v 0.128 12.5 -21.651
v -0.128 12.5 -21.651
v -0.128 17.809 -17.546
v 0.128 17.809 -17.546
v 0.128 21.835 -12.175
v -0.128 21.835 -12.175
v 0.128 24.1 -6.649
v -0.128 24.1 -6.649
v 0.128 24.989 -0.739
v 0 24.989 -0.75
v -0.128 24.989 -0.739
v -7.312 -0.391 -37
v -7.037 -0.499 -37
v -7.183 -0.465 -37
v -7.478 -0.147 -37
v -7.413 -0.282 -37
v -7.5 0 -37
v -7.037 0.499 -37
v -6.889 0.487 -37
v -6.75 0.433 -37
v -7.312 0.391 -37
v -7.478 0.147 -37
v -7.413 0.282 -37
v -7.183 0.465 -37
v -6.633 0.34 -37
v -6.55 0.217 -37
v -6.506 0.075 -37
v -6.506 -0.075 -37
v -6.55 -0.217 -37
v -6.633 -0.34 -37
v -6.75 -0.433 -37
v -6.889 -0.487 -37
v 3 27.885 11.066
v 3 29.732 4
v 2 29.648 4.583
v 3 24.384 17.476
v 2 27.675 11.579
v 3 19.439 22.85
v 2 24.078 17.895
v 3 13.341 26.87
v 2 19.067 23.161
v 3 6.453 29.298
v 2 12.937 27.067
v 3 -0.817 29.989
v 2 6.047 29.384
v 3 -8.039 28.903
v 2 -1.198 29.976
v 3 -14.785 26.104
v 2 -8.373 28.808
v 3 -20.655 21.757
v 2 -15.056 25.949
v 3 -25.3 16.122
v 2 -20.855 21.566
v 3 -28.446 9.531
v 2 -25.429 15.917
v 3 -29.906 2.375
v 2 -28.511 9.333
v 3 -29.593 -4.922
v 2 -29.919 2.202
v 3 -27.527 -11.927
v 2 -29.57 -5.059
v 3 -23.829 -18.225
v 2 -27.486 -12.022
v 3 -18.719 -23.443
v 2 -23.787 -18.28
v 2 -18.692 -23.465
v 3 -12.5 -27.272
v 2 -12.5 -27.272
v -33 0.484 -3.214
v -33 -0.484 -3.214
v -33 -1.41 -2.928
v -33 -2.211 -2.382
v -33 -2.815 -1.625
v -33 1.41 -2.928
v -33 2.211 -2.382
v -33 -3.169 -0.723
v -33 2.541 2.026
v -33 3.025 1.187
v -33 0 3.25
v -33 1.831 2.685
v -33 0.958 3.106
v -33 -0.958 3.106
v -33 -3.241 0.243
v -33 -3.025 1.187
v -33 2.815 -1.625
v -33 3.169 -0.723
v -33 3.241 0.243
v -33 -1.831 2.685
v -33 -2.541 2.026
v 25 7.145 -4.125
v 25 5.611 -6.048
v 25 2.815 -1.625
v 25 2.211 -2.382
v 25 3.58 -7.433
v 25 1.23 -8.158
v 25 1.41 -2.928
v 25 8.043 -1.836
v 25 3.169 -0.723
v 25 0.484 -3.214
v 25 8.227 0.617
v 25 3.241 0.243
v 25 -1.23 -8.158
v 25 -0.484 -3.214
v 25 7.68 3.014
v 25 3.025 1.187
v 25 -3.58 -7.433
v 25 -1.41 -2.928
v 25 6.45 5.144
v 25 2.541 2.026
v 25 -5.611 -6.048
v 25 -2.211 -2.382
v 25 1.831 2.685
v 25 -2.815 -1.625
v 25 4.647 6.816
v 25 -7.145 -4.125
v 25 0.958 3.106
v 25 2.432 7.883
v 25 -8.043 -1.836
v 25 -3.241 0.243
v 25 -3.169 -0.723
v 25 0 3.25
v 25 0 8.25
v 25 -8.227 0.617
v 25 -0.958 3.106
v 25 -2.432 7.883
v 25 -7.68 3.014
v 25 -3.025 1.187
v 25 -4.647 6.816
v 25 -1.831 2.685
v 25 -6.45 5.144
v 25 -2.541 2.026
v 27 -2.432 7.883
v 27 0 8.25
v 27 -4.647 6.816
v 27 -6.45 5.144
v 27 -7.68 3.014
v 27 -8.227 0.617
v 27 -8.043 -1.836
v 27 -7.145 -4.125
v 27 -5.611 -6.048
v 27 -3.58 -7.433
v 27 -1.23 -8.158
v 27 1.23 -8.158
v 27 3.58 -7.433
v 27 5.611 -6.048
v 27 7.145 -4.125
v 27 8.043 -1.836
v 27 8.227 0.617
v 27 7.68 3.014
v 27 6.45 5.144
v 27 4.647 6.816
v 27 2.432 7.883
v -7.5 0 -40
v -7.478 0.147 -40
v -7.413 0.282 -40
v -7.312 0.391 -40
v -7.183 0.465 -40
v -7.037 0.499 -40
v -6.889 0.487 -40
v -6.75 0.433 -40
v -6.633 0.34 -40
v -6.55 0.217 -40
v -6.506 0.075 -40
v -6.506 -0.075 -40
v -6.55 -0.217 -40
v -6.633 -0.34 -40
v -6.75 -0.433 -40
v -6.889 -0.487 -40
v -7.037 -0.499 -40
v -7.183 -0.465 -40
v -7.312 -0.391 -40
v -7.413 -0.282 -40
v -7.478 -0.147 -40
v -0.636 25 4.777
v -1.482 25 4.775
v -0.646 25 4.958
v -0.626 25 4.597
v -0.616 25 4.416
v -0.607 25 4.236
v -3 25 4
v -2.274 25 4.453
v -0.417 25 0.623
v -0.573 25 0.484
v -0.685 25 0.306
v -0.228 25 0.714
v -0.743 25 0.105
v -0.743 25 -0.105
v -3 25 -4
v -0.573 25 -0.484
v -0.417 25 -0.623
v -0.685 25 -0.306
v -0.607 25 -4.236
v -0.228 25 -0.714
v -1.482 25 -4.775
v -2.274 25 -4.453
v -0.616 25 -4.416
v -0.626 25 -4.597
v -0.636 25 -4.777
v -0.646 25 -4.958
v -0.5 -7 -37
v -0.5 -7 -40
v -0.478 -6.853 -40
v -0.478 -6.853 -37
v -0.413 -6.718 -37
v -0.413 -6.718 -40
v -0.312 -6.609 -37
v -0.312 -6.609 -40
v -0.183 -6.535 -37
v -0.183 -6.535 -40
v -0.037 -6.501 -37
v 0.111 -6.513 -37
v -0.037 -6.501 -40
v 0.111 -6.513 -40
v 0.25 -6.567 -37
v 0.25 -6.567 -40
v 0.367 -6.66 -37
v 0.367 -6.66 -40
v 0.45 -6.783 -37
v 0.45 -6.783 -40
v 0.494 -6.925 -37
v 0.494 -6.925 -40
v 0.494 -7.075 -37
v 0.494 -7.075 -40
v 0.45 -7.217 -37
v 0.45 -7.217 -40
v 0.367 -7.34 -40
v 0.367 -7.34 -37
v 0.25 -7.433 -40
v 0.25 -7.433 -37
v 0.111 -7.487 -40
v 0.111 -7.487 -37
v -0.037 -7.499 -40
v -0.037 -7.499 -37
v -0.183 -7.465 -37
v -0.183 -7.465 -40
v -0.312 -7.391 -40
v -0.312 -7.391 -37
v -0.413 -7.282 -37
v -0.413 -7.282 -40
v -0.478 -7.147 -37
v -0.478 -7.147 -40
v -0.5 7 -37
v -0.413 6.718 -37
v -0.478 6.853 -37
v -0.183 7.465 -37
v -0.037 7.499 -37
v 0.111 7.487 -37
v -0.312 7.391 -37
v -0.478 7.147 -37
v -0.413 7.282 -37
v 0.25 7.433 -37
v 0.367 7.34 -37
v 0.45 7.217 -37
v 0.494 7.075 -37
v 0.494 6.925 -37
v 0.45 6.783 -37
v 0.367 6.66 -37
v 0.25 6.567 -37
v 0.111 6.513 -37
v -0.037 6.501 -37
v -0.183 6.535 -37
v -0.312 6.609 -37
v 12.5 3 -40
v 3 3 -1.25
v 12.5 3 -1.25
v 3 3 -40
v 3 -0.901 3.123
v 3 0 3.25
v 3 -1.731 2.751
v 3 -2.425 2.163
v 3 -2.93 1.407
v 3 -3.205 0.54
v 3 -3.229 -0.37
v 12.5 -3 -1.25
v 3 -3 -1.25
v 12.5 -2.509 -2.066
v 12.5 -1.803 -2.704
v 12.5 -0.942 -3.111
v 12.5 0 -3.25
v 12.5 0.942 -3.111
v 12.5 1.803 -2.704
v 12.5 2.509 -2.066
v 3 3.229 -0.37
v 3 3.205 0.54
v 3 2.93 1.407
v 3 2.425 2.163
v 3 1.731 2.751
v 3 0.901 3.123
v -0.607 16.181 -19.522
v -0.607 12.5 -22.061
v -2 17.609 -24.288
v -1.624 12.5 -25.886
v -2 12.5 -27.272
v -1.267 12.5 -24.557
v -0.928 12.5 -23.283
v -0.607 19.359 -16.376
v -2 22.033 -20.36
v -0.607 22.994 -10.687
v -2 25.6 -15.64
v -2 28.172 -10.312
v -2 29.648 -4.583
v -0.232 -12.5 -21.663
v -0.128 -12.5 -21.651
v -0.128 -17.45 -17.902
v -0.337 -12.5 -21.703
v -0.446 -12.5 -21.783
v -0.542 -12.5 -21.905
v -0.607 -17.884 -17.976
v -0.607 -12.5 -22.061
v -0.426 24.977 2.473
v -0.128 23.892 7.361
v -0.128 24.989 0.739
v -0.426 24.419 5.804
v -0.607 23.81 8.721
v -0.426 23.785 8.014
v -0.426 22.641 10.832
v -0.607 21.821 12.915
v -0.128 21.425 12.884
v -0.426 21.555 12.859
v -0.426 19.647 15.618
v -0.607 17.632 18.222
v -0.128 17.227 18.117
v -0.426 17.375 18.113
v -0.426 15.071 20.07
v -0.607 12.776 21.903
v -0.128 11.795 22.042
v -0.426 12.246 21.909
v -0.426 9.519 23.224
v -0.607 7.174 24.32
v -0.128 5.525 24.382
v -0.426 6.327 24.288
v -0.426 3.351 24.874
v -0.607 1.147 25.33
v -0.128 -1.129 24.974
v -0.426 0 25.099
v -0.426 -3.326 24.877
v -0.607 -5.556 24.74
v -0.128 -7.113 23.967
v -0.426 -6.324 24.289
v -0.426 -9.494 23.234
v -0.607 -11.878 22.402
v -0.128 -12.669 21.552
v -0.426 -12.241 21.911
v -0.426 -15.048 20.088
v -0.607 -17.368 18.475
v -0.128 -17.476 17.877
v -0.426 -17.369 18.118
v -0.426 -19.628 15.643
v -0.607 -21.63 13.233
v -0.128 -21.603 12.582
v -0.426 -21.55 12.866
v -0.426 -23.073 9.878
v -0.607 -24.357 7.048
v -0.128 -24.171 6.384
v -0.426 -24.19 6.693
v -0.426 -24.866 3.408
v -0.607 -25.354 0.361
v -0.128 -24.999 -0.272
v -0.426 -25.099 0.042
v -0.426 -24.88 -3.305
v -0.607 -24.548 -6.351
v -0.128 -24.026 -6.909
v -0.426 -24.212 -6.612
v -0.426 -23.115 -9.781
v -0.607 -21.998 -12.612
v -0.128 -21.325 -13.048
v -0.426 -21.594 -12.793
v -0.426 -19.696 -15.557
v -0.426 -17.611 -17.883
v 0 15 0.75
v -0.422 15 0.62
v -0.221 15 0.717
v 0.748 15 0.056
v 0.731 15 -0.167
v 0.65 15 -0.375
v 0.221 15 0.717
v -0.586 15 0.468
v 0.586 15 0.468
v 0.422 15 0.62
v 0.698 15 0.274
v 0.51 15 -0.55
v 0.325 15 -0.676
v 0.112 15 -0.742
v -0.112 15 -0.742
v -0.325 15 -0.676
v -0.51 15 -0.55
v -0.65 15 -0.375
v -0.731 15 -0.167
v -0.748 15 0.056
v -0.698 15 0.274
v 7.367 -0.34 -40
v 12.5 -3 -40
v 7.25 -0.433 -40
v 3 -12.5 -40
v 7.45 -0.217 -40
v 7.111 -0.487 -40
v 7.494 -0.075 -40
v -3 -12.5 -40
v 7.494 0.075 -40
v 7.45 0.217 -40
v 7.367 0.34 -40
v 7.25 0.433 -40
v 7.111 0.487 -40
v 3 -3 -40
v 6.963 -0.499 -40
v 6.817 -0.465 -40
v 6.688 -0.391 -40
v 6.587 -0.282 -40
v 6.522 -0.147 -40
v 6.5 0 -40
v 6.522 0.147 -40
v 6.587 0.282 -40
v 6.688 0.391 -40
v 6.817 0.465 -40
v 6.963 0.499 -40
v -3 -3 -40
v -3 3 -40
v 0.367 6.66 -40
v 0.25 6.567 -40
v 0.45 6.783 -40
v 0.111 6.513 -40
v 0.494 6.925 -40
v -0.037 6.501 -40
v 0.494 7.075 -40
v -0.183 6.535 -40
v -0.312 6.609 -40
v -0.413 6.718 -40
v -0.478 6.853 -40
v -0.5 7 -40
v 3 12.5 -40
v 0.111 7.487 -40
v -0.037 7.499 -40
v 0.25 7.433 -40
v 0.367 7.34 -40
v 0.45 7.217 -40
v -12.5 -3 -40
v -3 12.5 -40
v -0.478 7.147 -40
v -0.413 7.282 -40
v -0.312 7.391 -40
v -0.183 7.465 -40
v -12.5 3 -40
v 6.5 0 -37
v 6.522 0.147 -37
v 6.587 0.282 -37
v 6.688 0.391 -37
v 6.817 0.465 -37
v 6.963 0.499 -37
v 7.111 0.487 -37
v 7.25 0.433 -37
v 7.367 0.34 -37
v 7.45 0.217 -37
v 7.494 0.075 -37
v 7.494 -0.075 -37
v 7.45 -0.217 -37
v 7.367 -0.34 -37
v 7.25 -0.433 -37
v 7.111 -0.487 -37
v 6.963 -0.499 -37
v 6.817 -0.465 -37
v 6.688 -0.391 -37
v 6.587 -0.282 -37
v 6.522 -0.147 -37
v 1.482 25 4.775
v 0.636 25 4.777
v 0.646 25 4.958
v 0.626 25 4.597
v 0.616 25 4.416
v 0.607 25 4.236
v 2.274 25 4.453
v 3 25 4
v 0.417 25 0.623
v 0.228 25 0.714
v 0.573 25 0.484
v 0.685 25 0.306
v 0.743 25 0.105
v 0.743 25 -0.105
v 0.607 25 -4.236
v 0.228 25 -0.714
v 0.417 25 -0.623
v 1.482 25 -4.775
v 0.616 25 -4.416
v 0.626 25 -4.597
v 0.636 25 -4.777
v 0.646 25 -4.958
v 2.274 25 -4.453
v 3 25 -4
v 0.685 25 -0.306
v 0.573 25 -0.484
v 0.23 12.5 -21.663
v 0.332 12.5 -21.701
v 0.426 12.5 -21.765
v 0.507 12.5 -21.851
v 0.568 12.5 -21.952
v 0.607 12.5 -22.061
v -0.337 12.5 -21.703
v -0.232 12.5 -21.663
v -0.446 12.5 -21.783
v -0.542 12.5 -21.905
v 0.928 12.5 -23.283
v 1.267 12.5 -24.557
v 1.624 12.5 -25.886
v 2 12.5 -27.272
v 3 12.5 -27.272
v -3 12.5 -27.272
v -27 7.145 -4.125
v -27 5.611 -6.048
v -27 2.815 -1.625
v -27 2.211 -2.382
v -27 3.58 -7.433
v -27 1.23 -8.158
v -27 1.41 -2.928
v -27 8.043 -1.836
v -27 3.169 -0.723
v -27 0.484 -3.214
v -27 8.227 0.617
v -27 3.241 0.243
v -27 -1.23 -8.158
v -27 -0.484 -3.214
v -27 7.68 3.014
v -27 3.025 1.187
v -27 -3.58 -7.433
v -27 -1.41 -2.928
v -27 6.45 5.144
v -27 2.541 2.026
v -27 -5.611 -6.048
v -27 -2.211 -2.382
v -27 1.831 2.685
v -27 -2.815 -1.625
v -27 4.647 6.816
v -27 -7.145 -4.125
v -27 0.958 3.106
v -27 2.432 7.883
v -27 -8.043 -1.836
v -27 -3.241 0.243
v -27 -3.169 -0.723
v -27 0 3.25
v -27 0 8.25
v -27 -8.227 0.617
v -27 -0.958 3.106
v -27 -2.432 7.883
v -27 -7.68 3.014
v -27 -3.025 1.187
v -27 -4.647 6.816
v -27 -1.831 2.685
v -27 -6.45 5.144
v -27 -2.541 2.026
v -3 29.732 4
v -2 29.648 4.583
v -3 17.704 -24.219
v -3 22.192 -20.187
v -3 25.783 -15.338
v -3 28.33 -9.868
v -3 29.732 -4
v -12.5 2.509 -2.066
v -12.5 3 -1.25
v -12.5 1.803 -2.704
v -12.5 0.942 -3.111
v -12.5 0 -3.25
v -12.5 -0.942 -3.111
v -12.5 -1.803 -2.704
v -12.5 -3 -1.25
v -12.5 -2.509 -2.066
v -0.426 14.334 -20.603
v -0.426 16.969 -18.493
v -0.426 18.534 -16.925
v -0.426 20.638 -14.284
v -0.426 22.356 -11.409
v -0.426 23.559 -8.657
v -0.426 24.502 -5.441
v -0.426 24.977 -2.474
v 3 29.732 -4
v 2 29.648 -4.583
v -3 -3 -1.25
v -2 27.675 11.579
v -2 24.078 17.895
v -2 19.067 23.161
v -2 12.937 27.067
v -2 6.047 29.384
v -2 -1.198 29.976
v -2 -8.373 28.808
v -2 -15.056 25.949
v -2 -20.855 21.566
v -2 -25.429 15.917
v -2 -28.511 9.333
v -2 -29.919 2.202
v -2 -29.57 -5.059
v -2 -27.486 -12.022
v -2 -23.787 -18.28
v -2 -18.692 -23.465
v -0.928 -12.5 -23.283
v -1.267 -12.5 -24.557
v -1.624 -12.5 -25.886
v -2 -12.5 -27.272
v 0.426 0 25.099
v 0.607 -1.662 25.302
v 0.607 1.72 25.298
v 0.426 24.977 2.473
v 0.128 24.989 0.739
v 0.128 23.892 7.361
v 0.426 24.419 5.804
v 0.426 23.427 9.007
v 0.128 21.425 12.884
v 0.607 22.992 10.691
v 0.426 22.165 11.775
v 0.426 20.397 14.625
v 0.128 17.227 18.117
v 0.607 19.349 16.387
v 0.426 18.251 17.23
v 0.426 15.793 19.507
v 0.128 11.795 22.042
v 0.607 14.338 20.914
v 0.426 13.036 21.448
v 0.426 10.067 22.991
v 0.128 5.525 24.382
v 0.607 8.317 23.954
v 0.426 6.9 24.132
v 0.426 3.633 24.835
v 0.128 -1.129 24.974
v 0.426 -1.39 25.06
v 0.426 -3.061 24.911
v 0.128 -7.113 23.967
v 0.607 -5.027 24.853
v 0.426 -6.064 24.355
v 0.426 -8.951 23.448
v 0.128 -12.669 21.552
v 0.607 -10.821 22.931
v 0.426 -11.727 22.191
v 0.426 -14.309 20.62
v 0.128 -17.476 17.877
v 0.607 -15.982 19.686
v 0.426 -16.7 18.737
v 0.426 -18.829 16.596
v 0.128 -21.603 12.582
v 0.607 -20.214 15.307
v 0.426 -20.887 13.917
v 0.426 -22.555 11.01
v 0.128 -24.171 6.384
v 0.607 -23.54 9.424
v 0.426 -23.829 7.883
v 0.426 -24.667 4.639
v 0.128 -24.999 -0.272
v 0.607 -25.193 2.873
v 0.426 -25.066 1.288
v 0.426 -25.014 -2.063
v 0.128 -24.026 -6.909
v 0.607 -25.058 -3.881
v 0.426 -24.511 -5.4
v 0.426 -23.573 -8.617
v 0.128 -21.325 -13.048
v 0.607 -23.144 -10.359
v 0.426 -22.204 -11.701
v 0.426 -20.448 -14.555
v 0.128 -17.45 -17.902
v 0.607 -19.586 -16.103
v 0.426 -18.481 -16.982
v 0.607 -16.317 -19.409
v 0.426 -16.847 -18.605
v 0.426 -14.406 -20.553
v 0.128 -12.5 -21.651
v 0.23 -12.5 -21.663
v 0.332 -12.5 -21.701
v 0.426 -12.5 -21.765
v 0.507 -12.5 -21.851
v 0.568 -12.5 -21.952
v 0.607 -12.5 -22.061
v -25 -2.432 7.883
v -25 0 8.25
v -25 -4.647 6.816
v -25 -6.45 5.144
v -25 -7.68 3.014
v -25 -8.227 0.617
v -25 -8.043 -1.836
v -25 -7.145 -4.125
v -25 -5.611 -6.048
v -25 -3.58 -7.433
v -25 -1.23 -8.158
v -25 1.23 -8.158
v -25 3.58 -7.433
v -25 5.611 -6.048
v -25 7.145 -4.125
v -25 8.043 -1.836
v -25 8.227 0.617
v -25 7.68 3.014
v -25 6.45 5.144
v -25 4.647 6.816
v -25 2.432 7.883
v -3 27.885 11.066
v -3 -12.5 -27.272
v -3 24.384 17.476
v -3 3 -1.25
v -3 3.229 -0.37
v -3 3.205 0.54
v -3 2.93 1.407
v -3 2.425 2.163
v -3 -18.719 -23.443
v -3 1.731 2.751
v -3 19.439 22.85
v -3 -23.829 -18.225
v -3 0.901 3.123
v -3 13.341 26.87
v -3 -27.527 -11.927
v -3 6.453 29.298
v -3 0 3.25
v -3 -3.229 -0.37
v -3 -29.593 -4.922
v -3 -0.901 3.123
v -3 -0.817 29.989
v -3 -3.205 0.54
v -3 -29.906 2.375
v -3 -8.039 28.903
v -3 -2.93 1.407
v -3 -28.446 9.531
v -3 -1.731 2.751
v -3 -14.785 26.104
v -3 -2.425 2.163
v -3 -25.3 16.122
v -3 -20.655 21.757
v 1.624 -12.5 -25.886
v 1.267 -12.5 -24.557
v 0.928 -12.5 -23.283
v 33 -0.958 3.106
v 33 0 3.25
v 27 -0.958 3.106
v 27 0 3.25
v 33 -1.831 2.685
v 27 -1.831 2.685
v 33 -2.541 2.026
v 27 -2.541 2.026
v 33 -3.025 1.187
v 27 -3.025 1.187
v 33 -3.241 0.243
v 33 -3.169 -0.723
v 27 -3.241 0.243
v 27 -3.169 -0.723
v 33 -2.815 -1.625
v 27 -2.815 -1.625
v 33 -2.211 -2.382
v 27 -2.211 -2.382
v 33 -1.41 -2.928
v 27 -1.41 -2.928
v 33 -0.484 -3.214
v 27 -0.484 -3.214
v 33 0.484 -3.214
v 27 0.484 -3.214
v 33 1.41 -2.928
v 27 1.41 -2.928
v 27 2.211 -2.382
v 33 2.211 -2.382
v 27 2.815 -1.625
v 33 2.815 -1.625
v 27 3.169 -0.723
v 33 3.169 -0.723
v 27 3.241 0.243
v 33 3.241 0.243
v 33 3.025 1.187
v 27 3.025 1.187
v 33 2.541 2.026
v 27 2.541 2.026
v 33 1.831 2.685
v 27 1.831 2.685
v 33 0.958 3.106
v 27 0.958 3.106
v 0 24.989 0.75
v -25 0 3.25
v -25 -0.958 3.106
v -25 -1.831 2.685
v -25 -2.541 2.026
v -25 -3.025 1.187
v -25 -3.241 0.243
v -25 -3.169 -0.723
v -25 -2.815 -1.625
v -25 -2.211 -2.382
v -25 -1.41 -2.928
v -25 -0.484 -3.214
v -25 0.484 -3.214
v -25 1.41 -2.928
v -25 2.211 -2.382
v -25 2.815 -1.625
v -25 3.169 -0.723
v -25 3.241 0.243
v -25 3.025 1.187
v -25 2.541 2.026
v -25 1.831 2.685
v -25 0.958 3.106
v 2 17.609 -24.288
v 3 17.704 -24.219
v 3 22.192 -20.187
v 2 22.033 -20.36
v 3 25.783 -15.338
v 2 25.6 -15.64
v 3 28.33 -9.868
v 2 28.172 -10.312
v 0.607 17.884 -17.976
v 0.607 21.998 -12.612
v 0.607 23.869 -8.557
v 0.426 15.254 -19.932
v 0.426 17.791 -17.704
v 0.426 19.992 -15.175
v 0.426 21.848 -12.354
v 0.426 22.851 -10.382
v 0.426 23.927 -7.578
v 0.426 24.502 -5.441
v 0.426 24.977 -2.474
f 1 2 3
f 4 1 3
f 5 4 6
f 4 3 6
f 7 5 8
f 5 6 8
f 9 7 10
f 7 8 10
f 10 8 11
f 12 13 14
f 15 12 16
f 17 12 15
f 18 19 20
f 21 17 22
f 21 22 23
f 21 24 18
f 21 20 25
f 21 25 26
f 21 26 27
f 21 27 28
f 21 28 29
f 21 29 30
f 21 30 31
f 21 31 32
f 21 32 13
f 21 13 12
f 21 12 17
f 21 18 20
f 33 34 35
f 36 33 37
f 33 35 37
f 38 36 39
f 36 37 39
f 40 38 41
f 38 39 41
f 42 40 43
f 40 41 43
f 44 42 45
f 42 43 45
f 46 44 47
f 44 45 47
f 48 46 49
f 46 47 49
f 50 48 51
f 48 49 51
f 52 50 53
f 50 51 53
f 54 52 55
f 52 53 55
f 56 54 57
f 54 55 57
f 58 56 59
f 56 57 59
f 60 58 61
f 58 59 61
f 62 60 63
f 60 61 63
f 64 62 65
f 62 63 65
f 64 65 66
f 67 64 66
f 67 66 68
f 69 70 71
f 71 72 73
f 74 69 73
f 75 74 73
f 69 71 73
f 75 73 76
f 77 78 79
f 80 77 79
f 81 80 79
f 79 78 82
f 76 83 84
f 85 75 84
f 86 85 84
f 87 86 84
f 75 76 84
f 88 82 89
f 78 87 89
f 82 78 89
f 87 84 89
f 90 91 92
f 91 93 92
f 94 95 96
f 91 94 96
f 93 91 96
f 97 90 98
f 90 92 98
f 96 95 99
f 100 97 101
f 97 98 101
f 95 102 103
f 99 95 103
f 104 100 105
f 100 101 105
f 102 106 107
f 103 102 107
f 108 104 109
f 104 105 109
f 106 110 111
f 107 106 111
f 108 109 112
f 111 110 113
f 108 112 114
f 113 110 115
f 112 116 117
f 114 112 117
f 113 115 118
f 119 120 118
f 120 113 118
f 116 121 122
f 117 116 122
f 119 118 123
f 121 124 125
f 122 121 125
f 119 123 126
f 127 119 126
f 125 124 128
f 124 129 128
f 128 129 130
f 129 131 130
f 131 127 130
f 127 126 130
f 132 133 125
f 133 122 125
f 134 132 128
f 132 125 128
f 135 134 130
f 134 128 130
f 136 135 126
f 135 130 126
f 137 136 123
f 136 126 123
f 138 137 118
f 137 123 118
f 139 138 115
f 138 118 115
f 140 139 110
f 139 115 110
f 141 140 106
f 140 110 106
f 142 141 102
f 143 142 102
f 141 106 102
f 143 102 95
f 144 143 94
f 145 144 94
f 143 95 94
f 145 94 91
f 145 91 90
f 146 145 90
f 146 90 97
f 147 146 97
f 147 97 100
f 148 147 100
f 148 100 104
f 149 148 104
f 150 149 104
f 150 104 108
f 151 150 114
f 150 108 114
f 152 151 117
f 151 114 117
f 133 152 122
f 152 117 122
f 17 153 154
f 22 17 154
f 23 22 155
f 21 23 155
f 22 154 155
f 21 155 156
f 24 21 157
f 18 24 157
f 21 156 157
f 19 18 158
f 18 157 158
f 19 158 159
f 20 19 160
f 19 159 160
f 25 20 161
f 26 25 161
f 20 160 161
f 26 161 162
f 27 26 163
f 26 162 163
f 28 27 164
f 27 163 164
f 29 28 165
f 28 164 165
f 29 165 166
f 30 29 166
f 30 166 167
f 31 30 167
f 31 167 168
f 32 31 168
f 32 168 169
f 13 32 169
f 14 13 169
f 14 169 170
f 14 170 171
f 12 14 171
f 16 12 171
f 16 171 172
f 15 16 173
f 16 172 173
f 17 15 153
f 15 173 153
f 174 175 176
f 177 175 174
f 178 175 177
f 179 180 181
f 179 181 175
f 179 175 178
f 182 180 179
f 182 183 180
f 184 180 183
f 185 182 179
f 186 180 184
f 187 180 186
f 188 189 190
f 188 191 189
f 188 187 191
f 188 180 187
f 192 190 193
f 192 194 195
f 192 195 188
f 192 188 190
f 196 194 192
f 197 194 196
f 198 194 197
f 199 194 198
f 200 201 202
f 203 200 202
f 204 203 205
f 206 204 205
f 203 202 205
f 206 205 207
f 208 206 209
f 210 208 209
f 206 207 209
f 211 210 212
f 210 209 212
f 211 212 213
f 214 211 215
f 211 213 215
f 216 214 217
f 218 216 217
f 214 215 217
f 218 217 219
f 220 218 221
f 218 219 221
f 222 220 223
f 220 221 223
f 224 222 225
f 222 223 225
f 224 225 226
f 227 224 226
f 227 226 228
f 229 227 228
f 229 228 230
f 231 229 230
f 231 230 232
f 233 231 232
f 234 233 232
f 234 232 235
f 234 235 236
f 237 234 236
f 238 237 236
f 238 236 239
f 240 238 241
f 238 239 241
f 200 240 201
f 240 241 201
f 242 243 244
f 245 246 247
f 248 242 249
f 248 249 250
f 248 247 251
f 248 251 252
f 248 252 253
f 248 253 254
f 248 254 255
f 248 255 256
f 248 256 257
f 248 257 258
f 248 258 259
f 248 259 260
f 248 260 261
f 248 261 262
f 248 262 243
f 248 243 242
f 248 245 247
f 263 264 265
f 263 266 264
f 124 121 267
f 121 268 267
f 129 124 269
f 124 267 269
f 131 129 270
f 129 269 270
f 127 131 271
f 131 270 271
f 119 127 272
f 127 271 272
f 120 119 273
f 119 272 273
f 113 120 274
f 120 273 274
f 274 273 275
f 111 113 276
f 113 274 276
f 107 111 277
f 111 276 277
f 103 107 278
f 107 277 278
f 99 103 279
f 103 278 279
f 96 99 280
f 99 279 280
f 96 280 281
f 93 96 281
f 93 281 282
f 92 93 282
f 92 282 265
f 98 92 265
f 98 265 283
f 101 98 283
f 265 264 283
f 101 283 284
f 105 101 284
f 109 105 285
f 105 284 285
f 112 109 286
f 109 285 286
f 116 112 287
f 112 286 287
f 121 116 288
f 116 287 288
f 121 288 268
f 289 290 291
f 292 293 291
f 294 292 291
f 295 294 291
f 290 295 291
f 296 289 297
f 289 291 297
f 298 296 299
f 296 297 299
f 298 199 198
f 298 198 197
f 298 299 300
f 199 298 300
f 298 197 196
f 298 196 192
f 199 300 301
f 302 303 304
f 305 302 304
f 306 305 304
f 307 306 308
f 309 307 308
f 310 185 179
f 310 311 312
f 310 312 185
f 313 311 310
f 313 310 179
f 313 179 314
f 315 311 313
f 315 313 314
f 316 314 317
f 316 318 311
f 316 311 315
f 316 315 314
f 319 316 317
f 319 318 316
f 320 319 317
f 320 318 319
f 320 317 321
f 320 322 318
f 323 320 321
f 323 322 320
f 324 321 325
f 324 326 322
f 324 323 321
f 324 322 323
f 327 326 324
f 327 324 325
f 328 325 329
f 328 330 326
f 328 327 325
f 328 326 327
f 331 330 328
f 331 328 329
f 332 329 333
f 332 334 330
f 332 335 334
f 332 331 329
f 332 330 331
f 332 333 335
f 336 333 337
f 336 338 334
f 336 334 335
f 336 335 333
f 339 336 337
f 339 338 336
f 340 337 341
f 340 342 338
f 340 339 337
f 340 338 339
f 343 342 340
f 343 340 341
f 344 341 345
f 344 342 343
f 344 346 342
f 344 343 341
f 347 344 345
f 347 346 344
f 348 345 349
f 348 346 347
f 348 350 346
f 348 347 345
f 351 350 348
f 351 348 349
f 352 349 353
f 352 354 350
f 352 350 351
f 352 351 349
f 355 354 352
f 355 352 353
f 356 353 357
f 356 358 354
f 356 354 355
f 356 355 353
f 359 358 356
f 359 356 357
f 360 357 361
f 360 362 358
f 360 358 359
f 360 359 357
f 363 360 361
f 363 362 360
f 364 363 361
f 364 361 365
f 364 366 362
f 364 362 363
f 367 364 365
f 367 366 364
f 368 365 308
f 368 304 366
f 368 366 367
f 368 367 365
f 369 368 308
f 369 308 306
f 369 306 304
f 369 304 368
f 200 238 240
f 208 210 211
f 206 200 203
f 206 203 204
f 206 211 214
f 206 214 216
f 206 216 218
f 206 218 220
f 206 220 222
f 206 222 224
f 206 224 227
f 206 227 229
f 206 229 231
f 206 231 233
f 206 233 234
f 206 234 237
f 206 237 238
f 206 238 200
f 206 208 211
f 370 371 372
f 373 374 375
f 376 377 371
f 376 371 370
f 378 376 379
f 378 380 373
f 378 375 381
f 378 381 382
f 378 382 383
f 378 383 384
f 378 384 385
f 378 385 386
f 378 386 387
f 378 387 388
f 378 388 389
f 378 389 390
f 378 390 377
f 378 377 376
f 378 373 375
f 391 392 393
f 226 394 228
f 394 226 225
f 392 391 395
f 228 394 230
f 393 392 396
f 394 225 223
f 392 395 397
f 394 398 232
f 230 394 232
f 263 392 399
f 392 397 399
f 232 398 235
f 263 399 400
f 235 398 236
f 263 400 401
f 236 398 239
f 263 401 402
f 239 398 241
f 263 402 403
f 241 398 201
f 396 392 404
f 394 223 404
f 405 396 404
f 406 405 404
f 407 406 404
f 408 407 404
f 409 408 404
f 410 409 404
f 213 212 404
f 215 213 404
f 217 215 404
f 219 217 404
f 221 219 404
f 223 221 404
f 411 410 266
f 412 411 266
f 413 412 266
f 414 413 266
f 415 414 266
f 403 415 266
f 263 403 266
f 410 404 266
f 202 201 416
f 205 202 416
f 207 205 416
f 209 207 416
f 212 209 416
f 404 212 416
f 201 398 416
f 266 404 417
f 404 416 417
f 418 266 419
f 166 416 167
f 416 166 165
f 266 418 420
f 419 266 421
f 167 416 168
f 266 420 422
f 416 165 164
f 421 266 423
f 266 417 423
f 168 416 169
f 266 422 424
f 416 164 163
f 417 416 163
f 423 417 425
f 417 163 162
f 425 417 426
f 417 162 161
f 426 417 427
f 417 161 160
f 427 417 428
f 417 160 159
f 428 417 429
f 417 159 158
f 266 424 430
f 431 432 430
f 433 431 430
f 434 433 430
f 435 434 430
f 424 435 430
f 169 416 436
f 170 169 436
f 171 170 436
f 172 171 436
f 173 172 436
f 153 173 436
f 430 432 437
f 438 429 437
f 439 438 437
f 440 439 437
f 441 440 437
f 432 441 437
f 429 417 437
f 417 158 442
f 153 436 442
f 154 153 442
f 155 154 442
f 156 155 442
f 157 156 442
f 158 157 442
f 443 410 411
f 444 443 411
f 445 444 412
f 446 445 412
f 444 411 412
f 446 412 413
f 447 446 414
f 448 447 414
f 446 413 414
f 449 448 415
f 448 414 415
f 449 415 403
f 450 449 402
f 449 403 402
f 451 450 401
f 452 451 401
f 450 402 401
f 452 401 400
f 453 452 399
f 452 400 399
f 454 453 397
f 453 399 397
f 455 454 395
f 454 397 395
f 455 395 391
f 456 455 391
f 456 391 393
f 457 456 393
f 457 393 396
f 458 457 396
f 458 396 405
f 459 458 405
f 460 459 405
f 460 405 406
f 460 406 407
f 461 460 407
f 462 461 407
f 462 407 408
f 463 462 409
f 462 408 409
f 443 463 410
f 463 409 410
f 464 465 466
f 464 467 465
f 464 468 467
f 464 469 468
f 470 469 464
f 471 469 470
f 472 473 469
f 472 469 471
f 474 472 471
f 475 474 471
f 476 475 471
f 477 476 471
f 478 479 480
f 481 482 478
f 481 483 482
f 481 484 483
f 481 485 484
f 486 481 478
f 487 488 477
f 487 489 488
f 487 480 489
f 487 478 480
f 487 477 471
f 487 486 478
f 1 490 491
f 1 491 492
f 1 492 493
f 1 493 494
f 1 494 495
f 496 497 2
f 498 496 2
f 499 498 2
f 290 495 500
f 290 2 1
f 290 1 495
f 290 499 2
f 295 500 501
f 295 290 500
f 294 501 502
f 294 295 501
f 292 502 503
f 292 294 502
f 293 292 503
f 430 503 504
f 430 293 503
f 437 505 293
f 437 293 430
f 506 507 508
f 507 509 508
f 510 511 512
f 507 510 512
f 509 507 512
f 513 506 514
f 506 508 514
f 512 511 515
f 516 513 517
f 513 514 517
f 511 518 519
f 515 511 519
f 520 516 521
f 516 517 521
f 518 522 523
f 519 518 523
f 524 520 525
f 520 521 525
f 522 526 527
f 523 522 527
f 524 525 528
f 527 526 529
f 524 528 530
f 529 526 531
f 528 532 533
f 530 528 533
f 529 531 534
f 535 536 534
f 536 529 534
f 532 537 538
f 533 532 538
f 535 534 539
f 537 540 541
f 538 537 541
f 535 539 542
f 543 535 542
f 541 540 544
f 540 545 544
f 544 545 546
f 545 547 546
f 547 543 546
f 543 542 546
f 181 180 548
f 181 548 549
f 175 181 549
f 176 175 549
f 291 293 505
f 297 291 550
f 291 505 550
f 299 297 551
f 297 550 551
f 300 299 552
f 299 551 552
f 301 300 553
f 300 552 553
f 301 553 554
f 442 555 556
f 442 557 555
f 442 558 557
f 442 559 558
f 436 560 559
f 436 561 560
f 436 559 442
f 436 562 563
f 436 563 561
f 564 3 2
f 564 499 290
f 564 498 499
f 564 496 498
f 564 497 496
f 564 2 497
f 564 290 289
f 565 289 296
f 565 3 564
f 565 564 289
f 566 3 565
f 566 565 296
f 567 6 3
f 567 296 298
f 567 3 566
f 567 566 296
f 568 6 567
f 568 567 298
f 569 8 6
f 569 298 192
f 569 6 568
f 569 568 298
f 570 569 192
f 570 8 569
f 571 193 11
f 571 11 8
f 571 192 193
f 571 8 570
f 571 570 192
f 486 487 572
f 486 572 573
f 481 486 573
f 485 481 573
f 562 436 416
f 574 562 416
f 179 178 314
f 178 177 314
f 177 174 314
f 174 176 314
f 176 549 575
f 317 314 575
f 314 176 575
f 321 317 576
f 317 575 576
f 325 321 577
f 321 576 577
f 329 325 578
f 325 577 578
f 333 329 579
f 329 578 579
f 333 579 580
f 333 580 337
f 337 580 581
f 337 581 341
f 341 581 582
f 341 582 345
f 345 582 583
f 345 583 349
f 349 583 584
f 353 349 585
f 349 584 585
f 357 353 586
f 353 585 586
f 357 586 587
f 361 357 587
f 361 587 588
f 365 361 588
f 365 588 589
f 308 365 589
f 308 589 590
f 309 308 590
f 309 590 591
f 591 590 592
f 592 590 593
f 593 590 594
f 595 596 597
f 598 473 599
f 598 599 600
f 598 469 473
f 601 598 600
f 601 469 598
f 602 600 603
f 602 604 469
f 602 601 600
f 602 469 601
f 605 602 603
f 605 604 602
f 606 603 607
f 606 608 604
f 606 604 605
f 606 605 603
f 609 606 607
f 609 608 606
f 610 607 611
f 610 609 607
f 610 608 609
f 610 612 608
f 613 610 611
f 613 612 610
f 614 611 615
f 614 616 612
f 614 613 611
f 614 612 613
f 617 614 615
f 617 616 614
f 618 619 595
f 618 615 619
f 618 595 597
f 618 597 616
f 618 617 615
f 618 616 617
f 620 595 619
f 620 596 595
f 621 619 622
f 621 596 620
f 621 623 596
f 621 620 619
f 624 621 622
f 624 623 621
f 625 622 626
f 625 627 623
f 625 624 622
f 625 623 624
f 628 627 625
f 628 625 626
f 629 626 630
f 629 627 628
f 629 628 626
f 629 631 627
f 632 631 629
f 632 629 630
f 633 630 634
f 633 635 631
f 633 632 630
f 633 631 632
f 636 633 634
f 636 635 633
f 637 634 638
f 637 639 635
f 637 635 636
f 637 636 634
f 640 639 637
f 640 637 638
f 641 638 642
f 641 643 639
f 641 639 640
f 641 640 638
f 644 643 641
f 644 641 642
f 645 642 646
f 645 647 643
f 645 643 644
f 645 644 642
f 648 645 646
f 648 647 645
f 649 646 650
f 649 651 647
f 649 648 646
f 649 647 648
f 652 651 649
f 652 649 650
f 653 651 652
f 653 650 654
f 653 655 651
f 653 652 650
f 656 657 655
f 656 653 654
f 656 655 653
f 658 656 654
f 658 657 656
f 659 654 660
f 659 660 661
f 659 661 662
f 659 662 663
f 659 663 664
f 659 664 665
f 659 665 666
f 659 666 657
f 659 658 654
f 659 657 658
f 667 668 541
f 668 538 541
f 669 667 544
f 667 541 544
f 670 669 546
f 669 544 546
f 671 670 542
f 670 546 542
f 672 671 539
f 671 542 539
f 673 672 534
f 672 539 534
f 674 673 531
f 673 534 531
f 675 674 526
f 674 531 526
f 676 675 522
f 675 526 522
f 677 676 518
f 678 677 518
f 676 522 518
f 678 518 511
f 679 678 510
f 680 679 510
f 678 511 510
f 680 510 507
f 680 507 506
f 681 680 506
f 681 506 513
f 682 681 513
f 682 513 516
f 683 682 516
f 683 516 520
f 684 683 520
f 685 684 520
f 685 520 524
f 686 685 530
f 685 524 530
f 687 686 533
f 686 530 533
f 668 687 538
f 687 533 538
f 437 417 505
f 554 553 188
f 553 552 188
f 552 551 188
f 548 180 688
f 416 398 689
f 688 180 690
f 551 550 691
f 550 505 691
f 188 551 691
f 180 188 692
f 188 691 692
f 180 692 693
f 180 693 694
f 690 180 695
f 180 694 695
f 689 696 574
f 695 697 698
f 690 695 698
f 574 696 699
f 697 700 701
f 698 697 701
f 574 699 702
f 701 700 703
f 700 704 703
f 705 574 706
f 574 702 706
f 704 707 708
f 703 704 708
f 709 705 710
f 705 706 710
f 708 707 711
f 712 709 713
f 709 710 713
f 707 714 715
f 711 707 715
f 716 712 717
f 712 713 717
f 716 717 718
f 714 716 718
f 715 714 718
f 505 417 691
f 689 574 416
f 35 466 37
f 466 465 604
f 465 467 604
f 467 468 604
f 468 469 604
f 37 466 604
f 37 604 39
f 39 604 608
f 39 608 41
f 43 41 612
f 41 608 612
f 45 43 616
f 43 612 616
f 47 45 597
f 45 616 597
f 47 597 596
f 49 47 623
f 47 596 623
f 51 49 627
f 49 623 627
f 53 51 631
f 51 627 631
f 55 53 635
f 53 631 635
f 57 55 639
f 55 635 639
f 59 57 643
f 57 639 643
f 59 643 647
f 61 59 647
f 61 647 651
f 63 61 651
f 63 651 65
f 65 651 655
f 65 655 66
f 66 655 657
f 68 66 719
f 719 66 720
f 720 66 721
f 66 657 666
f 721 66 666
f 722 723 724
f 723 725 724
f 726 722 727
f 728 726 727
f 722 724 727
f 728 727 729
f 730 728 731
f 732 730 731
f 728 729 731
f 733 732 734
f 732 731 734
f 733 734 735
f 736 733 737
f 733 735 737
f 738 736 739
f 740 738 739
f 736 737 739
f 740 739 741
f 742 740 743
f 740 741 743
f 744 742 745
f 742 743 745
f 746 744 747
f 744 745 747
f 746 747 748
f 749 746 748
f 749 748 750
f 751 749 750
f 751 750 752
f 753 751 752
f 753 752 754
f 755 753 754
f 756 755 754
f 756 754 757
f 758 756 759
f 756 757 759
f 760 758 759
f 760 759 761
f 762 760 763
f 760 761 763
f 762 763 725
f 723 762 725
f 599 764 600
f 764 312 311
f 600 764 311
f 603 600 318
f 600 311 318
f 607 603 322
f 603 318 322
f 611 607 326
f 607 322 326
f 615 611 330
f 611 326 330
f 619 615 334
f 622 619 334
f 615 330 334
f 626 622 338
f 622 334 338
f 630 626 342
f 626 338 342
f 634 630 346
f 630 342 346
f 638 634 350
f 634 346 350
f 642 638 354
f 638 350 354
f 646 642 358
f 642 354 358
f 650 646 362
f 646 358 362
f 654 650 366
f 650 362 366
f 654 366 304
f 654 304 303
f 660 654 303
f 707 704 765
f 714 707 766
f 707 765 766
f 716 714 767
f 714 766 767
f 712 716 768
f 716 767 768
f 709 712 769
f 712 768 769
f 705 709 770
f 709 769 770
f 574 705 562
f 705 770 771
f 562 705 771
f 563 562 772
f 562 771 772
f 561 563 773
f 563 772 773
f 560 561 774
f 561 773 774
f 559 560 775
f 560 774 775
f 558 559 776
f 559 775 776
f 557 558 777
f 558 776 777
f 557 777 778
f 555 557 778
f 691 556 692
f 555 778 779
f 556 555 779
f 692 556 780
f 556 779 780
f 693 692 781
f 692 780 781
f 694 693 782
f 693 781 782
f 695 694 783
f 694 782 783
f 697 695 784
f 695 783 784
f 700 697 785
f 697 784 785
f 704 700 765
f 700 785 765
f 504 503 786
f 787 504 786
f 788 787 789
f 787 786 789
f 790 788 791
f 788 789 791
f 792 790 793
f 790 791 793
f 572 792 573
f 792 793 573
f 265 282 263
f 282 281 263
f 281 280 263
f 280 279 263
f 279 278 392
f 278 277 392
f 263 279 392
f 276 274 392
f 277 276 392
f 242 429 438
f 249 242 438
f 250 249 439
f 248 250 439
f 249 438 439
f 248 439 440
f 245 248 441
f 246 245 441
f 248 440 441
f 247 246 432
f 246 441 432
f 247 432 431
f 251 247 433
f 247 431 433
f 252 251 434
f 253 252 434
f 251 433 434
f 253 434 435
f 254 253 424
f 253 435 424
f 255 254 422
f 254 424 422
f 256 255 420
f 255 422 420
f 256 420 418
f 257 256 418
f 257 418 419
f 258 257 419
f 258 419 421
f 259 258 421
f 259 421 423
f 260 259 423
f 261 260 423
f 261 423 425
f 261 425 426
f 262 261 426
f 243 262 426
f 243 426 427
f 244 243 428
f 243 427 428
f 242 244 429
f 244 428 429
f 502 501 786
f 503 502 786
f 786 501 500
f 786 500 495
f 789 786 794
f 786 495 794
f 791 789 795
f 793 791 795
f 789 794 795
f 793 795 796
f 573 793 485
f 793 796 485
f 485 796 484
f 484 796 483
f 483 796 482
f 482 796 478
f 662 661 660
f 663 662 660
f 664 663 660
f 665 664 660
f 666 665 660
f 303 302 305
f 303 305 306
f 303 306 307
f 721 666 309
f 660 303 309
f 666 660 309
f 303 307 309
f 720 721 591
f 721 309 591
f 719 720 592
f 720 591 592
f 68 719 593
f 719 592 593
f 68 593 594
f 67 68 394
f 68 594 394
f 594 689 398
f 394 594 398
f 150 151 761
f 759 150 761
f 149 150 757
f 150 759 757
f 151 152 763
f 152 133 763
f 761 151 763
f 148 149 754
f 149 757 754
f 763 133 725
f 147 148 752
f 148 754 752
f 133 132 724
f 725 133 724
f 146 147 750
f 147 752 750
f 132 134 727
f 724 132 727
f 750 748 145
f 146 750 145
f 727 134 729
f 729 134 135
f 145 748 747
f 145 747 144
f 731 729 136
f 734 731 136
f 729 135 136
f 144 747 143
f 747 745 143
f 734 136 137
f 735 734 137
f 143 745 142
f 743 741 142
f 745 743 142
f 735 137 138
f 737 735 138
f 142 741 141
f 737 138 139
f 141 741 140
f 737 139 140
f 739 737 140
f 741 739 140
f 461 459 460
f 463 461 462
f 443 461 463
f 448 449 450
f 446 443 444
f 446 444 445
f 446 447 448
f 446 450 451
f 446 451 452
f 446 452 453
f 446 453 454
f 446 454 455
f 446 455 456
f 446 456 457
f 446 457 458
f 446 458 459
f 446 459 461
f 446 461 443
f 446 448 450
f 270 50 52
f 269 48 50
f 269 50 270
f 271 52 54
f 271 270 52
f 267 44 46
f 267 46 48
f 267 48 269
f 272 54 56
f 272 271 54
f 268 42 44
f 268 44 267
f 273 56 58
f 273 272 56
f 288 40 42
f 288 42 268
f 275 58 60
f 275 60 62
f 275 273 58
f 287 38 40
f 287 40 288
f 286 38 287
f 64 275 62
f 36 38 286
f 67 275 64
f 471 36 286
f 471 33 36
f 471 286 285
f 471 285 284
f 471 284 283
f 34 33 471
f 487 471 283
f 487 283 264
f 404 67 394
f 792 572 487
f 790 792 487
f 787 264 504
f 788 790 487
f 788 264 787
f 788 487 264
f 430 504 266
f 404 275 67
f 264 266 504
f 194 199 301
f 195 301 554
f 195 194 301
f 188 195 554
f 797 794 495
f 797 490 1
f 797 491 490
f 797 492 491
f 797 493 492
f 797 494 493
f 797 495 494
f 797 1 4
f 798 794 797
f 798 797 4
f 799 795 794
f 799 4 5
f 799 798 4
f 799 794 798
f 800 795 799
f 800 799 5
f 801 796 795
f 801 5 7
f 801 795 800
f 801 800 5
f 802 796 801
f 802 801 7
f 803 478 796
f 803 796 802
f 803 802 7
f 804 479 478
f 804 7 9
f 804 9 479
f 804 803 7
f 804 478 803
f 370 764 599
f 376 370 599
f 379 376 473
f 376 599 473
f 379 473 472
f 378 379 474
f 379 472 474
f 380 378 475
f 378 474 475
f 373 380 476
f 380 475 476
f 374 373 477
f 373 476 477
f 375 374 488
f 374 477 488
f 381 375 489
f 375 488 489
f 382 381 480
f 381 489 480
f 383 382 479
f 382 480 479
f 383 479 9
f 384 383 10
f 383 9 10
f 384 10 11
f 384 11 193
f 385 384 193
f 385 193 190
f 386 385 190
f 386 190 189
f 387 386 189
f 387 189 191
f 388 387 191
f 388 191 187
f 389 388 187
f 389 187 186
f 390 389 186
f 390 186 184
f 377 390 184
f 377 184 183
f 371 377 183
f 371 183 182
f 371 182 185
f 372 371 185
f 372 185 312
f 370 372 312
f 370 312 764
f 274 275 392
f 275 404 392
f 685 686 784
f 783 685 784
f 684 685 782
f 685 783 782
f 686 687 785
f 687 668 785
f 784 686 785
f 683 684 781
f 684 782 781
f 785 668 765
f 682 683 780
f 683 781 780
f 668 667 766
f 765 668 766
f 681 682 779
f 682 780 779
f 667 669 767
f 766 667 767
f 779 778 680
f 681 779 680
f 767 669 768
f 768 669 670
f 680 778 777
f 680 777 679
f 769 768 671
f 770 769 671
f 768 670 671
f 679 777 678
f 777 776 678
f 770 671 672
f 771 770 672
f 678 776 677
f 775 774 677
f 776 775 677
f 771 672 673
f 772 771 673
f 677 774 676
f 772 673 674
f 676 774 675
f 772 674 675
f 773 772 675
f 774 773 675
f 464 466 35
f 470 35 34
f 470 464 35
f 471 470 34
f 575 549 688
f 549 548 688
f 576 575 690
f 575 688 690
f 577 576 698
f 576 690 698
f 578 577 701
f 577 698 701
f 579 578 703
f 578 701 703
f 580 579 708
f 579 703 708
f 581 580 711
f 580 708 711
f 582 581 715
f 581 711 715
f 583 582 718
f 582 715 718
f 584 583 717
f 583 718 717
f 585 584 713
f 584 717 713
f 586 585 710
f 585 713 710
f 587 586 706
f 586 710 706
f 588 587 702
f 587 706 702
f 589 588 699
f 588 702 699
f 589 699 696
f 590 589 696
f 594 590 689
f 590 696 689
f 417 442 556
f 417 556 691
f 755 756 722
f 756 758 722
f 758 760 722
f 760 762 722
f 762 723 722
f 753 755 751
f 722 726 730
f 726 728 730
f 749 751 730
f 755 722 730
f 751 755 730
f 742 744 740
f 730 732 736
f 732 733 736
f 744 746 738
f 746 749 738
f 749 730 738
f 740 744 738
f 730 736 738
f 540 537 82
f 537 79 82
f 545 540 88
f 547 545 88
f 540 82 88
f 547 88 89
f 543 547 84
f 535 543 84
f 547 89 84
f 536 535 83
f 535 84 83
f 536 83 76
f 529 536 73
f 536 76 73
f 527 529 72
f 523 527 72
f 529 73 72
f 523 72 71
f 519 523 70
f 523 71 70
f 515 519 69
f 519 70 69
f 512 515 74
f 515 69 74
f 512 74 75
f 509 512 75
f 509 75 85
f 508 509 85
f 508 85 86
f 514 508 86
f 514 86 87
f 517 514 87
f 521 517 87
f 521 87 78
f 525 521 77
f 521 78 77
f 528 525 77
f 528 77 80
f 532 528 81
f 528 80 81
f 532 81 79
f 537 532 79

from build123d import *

# Parameters (mm, degrees)
FILLET3_R                = 0.5
BOSS_EXTRUDE1_DEPTH      = 3
BOSS_EXTRUDE1_DEPTH_BACK = 3
SKETCH2_W                = 40
SKETCH2_H                = 25
BOSS_EXTRUDE2_DEPTH      = 3
BOSS_EXTRUDE2_DEPTH_BACK = 3
SKETCH3_W                = 25
SKETCH3_H                = 40
SKETCH4_R                = 0.5
CUT_EXTRUDE1_DEPTH       = 3
SKETCH5_R                = 0.75
CUT_EXTRUDE2_DEPTH       = 10
SKETCH6_R                = 5
CUT_EXTRUDE3_DEPTH       = 76.591004882


with BuildPart() as part:
    # Sketch1 → Revolve1 (revolve)
    with BuildSketch(Plane.XY, mode=Mode.PRIVATE) as revolve1_sk:
        Polygon((-33, 0), (33, 0), (33, 3.25), (27, 3.25), (27, 8.25), (25, 8.25), (25, 3.25), (3, 3.25), (3, 30), (2, 30), (0.5, 25), (-0.5, 25), (-2, 30), (-3, 30), (-3, 3.25), (-25, 3.25), (-25, 8.25), (-27, 8.25), (-27, 3.25), (-33, 3.25), align=None)
    revolve(revolve1_sk.sketch.rotate(Axis((-33, 0, 0), (1, 0, 0)), 90), axis=Axis((-33, 0, 0), (1, 0, 0)))

    # Fillet3
    fillet3_edges = [part.edges().sort_by_distance(p)[0] for p in [
        (0.5, 0, -25),
        (-0.5, 0, -25),
    ]]
    fillet(fillet3_edges, radius=FILLET3_R)

    # Sketch2 → Boss-Extrude1 (add, two sides: drawn at the far end of the back side and taken through both)
    with BuildSketch(Plane(origin=(0, 0, 0), x_dir=(0, 0, -1), z_dir=(1, 0, 0)).offset(-BOSS_EXTRUDE1_DEPTH_BACK)):
        with Locations((20, 0)):
            Rectangle(SKETCH2_W, SKETCH2_H)
    extrude(amount=BOSS_EXTRUDE1_DEPTH + BOSS_EXTRUDE1_DEPTH_BACK)

    # Sketch3 → Boss-Extrude2 (add, two sides: drawn at the far end of the back side and taken through both)
    with BuildSketch(Plane(origin=(0, 0, 0), x_dir=(1, 0, 0), z_dir=(0, 1, 0)).offset(-BOSS_EXTRUDE2_DEPTH_BACK)):
        with Locations((0, 20)):
            Rectangle(SKETCH3_W, SKETCH3_H)
    extrude(amount=BOSS_EXTRUDE2_DEPTH + BOSS_EXTRUDE2_DEPTH_BACK)

    # Sketch4 → Cut-Extrude1 (cut)
    with BuildSketch(Plane(origin=(0, 0, -40), x_dir=(-1, 0, 0), z_dir=(0, 0, -1))):
        with Locations((7, 0)):
            Circle(SKETCH4_R)
        with Locations((-7, 0)):
            Circle(SKETCH4_R)
        with Locations((0, 7)):
            Circle(SKETCH4_R)
        with Locations((0, -7)):
            Circle(SKETCH4_R)
    extrude(amount=-CUT_EXTRUDE1_DEPTH, mode=Mode.SUBTRACT)

    # Sketch5 → Cut-Extrude2 (cut)
    with BuildSketch(Plane(origin=(0, 25, 0), x_dir=(1, 0, 0), z_dir=(0, 1, 0))):
        with Locations(Location((0, 0, 0), (0, 0, 270))):
            Circle(SKETCH5_R)
    extrude(amount=-CUT_EXTRUDE2_DEPTH, mode=Mode.SUBTRACT)

    # Sketch6 → Cut-Extrude3 (cut, through all)
    with BuildSketch(Plane(origin=(0, 25, 0), x_dir=(1, 0, 0), z_dir=(0, 1, 0))):
        Circle(SKETCH6_R)
    extrude(amount=CUT_EXTRUDE3_DEPTH, mode=Mode.SUBTRACT)


solid = part.part
